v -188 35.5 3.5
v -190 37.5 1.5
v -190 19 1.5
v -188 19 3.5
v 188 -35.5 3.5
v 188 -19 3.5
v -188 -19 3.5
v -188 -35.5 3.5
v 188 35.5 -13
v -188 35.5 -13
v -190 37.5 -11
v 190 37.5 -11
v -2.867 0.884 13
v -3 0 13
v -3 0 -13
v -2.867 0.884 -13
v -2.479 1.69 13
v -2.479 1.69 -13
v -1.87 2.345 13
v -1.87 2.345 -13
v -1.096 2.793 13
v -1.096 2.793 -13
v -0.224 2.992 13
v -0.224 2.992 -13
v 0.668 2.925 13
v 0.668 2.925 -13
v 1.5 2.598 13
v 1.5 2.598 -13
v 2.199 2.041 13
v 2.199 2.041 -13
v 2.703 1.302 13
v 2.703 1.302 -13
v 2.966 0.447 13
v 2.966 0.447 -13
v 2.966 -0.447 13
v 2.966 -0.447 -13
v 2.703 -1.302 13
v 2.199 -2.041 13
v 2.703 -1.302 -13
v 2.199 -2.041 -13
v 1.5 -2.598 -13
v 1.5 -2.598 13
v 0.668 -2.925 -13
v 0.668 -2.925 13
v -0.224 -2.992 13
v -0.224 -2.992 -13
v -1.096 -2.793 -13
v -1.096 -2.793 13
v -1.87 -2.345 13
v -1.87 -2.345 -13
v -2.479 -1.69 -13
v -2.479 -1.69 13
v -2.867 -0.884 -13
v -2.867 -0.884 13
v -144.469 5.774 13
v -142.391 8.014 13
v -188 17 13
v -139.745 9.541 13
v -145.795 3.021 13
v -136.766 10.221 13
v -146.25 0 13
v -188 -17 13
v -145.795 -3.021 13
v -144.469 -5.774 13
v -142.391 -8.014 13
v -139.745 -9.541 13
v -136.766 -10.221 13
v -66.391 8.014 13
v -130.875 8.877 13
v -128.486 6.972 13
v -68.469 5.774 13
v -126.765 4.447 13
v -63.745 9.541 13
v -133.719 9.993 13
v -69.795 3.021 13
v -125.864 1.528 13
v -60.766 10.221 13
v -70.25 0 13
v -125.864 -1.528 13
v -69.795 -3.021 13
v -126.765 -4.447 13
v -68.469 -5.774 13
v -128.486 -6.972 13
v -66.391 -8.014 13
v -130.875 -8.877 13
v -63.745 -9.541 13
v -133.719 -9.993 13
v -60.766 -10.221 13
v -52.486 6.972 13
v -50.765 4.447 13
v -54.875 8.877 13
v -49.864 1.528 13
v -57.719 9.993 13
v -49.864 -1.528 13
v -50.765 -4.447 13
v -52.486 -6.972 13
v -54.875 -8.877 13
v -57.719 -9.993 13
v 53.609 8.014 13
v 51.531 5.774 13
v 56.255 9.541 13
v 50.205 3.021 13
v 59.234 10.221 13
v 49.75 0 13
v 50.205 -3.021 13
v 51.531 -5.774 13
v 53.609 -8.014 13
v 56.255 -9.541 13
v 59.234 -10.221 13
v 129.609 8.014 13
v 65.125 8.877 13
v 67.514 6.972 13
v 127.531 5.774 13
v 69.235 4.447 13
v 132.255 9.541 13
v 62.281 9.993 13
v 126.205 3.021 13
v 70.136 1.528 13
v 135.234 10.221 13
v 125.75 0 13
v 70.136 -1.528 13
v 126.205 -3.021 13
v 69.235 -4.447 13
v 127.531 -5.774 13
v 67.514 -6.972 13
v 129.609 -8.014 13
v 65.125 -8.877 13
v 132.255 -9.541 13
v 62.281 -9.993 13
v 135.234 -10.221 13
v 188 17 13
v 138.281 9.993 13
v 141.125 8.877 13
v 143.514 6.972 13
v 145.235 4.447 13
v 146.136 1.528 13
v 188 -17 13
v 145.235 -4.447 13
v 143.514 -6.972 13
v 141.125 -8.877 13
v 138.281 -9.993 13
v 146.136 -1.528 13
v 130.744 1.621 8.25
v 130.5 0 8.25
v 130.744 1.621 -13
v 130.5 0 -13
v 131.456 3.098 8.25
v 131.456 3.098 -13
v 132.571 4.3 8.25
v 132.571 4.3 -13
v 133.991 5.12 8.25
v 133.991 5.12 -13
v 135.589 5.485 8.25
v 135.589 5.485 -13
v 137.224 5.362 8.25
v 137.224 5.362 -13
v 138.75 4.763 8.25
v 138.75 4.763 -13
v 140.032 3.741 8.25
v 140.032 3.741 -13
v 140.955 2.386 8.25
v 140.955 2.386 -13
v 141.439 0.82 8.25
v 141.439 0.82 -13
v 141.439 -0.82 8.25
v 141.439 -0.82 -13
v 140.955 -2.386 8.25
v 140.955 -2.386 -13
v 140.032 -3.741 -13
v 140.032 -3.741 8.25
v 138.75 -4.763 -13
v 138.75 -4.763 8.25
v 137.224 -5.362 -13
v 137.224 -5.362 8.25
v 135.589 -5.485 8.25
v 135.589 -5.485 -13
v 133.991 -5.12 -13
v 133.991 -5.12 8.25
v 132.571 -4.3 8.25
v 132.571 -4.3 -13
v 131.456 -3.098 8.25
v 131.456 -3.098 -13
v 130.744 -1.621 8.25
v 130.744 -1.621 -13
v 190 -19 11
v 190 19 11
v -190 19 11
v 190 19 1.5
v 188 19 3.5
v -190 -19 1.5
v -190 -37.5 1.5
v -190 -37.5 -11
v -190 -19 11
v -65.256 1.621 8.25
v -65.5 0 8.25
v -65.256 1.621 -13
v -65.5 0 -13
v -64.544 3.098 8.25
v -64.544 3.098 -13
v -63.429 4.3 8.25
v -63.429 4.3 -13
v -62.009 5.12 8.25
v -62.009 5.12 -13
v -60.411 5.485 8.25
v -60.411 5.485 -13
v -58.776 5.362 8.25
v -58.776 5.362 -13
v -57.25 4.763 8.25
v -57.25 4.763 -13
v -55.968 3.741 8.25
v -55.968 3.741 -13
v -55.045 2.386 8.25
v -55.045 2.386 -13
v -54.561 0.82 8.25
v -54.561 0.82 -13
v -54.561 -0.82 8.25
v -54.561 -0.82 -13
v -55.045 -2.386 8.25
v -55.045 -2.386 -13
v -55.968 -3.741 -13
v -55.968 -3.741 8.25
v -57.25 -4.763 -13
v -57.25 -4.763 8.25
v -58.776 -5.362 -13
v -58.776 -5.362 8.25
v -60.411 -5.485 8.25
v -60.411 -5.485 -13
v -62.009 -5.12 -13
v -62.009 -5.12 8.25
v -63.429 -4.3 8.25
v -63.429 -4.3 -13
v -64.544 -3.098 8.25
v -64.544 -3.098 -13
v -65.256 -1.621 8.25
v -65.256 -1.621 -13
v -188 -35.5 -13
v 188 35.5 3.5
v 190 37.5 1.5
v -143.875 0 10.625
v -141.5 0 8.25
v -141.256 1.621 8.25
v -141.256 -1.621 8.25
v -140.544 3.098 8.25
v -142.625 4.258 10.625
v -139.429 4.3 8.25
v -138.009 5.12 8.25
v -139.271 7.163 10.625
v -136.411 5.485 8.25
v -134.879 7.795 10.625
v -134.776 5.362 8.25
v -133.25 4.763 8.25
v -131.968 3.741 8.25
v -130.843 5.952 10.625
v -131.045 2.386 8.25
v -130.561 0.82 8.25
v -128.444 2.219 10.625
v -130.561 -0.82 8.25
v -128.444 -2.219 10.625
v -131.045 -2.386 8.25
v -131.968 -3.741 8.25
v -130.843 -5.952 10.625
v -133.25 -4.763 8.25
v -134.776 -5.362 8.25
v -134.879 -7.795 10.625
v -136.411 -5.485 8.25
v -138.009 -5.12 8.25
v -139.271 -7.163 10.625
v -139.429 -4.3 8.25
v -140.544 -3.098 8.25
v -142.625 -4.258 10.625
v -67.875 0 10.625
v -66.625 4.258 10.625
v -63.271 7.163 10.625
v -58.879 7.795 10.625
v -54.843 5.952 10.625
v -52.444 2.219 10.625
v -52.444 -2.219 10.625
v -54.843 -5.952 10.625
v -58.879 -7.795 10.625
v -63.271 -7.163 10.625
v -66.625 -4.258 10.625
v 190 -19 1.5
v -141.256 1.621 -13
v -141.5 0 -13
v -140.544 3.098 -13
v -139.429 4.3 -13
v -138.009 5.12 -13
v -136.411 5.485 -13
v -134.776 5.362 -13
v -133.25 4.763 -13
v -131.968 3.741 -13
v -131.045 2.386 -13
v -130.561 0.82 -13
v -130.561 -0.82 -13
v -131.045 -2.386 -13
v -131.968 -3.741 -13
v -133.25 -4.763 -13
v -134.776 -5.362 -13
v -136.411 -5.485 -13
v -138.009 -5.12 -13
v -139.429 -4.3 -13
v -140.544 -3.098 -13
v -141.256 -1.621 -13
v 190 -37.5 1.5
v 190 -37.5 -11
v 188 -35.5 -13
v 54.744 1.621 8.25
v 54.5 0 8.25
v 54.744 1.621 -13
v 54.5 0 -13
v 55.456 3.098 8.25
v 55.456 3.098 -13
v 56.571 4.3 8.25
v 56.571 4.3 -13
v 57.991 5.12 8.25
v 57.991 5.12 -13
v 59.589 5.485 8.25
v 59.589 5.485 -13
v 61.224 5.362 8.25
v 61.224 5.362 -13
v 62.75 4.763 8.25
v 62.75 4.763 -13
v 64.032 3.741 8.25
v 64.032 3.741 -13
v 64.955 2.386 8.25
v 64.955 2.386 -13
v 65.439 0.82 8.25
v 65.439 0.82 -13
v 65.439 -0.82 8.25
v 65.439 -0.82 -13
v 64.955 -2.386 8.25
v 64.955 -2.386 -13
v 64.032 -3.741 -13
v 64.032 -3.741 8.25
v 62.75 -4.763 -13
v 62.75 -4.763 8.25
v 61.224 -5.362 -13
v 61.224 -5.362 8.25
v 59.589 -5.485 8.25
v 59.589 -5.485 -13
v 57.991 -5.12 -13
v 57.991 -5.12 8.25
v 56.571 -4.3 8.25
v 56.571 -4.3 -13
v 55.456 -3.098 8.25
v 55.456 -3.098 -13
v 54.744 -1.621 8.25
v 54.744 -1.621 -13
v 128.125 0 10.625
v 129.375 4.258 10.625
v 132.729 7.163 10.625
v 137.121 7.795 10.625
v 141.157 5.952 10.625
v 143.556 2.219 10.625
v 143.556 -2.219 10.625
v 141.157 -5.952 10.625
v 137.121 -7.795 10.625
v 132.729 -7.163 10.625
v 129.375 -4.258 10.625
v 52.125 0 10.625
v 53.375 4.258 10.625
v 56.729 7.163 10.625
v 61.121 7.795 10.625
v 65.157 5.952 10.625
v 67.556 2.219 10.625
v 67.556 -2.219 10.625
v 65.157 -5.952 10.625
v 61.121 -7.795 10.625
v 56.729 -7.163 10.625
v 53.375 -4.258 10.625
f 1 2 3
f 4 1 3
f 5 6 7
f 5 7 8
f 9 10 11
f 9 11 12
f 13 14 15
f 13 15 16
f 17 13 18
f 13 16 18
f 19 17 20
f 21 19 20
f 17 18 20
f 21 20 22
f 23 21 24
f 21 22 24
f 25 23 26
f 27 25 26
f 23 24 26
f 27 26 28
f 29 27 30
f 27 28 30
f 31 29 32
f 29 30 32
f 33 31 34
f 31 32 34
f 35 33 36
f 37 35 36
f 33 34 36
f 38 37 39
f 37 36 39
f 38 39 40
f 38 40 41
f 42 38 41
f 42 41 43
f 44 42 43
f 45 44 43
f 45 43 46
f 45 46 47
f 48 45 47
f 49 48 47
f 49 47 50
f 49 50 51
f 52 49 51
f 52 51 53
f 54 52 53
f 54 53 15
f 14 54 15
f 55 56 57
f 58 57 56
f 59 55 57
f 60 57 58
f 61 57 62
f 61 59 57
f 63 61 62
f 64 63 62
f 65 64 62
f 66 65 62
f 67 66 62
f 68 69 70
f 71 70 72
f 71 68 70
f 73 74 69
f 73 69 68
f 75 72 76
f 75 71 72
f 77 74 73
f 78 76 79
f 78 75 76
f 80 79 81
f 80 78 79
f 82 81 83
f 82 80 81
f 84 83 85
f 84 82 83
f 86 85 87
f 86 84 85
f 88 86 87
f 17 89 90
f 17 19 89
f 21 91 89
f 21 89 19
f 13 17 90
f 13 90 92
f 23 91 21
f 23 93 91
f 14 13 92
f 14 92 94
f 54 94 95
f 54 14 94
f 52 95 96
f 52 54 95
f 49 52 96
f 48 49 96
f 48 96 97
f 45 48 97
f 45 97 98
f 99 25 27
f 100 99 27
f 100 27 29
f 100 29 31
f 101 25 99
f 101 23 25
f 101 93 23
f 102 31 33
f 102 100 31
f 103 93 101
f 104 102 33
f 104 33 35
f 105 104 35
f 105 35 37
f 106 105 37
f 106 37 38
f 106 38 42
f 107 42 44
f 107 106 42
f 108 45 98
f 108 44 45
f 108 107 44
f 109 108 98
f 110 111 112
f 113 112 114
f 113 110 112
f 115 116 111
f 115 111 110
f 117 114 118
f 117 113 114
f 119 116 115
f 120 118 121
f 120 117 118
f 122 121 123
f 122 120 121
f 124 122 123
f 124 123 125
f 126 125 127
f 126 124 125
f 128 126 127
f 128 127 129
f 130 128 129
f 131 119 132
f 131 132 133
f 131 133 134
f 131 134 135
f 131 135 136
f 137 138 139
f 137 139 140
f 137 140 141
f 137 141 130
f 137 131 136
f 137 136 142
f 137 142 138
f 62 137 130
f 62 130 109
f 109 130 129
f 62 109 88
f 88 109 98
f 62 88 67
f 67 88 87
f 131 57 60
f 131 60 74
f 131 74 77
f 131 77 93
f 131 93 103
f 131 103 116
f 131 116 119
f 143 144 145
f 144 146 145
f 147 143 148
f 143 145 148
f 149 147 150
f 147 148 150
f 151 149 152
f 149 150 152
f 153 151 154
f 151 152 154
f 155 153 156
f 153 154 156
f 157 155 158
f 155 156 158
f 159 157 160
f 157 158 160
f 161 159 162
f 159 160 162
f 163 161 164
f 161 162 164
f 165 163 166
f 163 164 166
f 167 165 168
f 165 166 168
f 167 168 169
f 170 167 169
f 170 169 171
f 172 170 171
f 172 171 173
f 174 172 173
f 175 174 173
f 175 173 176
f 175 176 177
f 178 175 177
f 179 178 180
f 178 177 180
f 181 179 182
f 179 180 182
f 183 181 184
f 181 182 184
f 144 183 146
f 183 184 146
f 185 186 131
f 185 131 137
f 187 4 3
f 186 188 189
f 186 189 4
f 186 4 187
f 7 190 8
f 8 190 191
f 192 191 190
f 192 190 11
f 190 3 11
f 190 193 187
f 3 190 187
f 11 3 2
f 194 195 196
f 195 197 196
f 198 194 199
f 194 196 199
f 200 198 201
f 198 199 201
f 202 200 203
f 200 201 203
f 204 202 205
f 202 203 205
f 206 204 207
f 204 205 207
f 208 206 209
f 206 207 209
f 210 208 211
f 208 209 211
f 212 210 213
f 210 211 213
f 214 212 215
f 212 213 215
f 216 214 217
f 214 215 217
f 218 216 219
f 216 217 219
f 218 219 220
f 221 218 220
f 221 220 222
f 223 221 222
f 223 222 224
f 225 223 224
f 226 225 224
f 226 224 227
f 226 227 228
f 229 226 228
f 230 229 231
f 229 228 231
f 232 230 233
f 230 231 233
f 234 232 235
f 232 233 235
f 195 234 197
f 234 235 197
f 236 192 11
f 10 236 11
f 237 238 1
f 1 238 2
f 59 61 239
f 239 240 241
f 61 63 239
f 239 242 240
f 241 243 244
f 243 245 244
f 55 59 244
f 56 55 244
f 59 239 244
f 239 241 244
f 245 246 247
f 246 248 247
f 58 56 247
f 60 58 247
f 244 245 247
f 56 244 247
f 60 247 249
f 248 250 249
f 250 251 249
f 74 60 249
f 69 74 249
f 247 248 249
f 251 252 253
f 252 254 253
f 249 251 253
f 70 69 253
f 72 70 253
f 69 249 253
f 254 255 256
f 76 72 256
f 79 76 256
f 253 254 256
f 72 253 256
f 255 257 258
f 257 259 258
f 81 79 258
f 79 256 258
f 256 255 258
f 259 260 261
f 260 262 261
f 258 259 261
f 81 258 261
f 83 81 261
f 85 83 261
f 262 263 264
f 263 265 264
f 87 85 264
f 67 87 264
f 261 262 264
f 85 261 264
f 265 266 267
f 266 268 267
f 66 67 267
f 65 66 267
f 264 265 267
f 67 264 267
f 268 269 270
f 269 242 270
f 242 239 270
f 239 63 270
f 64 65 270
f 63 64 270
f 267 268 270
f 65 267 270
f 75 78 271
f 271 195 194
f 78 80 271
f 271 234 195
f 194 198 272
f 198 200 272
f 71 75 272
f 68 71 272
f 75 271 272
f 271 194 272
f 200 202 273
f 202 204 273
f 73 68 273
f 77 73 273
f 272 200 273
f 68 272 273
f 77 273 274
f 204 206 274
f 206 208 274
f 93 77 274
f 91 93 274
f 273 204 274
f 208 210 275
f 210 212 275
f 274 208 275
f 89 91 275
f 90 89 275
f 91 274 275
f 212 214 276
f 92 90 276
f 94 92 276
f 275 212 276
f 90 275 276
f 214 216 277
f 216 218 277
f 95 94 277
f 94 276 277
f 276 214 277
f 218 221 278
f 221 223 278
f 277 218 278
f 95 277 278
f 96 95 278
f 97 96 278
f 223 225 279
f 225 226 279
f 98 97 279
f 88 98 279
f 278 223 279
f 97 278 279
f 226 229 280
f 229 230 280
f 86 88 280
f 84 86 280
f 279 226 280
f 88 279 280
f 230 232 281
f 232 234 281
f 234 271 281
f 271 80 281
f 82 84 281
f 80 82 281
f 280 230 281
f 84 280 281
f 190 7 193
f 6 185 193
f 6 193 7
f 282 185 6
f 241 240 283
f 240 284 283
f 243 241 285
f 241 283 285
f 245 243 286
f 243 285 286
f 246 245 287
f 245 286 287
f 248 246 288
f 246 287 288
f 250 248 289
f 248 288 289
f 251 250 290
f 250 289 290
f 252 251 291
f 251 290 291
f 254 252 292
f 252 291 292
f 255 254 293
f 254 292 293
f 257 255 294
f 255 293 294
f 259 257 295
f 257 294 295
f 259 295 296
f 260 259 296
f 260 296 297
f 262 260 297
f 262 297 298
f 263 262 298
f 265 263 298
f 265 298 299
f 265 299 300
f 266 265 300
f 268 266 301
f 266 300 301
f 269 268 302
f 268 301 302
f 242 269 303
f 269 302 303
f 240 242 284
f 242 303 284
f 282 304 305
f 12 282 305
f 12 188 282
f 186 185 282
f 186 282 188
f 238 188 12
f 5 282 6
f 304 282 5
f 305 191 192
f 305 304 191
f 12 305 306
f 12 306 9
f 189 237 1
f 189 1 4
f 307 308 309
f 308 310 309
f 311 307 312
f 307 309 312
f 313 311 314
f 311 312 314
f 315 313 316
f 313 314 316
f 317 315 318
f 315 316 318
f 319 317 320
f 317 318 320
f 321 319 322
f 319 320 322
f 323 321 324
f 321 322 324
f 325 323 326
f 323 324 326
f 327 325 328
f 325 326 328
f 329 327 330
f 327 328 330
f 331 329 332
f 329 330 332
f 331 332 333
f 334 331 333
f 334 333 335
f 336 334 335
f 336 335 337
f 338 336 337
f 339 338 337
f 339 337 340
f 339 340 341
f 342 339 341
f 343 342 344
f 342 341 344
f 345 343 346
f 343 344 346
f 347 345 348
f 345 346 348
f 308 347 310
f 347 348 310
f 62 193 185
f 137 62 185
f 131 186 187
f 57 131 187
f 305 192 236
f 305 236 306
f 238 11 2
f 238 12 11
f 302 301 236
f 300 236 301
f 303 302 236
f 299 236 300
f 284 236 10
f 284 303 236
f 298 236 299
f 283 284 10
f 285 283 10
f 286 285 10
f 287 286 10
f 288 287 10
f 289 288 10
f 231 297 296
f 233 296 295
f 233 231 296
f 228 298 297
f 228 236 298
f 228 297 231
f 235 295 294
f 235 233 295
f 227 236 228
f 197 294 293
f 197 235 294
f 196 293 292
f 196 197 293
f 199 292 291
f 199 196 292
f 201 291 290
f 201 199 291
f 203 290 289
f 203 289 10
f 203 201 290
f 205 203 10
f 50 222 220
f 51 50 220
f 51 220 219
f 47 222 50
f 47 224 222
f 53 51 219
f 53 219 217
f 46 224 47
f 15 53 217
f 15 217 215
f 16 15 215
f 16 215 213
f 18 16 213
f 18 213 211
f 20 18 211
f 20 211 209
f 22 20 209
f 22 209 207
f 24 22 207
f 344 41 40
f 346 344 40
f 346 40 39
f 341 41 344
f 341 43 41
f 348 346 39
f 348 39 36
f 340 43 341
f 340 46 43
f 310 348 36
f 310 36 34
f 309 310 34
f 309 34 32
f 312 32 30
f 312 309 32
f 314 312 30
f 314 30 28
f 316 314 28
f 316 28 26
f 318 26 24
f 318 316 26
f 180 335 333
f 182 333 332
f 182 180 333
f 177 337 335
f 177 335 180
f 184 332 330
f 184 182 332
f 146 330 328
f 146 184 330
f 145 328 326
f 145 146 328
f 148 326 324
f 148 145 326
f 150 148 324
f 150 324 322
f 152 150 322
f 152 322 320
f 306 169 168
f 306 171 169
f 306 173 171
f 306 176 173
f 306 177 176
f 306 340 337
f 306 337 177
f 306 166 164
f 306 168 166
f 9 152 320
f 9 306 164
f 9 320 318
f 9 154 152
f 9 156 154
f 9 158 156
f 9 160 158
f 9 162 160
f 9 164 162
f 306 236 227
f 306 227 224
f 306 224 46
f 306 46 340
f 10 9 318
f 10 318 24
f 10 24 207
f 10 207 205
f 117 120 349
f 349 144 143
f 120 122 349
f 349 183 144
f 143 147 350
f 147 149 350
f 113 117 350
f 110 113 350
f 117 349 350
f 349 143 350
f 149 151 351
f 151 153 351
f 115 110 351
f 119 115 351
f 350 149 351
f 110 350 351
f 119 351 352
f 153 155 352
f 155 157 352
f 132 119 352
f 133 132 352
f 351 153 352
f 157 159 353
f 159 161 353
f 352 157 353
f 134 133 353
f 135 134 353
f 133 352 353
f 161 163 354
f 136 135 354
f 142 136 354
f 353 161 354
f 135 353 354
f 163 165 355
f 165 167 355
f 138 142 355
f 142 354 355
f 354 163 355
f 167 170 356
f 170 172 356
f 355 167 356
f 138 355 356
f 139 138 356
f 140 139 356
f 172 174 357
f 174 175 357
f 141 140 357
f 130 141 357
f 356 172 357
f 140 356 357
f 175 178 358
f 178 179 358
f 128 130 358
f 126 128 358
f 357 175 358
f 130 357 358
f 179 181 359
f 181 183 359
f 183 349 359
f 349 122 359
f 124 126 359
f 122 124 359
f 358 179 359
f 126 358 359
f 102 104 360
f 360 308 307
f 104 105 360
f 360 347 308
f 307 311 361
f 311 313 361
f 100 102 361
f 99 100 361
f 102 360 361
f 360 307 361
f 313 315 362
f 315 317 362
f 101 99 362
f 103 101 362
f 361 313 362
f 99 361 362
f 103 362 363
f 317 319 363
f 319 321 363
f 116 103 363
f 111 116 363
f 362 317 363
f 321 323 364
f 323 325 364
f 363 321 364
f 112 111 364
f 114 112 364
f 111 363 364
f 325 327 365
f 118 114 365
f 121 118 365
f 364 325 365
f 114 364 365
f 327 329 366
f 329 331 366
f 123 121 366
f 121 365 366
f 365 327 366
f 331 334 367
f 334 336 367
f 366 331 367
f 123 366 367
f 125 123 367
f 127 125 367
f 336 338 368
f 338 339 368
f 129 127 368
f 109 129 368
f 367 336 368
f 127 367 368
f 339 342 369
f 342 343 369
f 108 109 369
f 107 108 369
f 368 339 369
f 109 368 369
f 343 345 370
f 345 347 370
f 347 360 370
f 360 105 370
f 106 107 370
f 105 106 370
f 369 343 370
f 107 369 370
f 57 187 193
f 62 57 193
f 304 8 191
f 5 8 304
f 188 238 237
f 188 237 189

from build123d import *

# Parameters (mm, degrees)
F1_DEPTH       = 190
F2_SIZE        = 2
F4_D           = 6
F5_D           = 11
F5_CSINK_D     = 20.5
F5_CSINK_ANGLE = 90


with BuildPart() as f1:
    # F0 (on Right) → F1 (new body, symmetric)
    with BuildSketch(Plane.YZ):
        Polygon((19, 13), (-19, 13), (-19, 3.5), (-37.5, 3.5), (-37.5, -13), (37.5, -13), (37.5, 3.5), (19, 3.5), align=None)
    extrude(amount=F1_DEPTH, both=True)

    # F2
    f2_edges = [f1.edges().sort_by_distance(p)[0] for p in [
        (0, -37.5, -13),
        (-190, 0, -13),
        (0, 37.5, -13),
        (190, 0, -13),
        (-190, 0, 13),
        (0, -19, 13),
        (190, 0, 13),
        (0, 19, 13),
        (0, -37.5, 3.5),
        (0, 37.5, 3.5),
        (190, 28.25, 3.5),
        (190, -28.25, 3.5),
        (-190, -28.25, 3.5),
        (-190, 28.25, 3.5),
    ]]
    chamfer(f2_edges, length=F2_SIZE)

    # F4 (through all)
    with Locations(Plane.XY.offset(13)):
        with Locations((0, 0)):
            Hole(F4_D / 2)

    # F5 (through all)
    with Locations(Plane.XY.offset(13)):
        with Locations((-136, 0), (-60, 0), (60, 0), (136, 0)):
            CounterSinkHole(F5_D / 2, F5_CSINK_D / 2, counter_sink_angle=F5_CSINK_ANGLE)


solid = f1.part
